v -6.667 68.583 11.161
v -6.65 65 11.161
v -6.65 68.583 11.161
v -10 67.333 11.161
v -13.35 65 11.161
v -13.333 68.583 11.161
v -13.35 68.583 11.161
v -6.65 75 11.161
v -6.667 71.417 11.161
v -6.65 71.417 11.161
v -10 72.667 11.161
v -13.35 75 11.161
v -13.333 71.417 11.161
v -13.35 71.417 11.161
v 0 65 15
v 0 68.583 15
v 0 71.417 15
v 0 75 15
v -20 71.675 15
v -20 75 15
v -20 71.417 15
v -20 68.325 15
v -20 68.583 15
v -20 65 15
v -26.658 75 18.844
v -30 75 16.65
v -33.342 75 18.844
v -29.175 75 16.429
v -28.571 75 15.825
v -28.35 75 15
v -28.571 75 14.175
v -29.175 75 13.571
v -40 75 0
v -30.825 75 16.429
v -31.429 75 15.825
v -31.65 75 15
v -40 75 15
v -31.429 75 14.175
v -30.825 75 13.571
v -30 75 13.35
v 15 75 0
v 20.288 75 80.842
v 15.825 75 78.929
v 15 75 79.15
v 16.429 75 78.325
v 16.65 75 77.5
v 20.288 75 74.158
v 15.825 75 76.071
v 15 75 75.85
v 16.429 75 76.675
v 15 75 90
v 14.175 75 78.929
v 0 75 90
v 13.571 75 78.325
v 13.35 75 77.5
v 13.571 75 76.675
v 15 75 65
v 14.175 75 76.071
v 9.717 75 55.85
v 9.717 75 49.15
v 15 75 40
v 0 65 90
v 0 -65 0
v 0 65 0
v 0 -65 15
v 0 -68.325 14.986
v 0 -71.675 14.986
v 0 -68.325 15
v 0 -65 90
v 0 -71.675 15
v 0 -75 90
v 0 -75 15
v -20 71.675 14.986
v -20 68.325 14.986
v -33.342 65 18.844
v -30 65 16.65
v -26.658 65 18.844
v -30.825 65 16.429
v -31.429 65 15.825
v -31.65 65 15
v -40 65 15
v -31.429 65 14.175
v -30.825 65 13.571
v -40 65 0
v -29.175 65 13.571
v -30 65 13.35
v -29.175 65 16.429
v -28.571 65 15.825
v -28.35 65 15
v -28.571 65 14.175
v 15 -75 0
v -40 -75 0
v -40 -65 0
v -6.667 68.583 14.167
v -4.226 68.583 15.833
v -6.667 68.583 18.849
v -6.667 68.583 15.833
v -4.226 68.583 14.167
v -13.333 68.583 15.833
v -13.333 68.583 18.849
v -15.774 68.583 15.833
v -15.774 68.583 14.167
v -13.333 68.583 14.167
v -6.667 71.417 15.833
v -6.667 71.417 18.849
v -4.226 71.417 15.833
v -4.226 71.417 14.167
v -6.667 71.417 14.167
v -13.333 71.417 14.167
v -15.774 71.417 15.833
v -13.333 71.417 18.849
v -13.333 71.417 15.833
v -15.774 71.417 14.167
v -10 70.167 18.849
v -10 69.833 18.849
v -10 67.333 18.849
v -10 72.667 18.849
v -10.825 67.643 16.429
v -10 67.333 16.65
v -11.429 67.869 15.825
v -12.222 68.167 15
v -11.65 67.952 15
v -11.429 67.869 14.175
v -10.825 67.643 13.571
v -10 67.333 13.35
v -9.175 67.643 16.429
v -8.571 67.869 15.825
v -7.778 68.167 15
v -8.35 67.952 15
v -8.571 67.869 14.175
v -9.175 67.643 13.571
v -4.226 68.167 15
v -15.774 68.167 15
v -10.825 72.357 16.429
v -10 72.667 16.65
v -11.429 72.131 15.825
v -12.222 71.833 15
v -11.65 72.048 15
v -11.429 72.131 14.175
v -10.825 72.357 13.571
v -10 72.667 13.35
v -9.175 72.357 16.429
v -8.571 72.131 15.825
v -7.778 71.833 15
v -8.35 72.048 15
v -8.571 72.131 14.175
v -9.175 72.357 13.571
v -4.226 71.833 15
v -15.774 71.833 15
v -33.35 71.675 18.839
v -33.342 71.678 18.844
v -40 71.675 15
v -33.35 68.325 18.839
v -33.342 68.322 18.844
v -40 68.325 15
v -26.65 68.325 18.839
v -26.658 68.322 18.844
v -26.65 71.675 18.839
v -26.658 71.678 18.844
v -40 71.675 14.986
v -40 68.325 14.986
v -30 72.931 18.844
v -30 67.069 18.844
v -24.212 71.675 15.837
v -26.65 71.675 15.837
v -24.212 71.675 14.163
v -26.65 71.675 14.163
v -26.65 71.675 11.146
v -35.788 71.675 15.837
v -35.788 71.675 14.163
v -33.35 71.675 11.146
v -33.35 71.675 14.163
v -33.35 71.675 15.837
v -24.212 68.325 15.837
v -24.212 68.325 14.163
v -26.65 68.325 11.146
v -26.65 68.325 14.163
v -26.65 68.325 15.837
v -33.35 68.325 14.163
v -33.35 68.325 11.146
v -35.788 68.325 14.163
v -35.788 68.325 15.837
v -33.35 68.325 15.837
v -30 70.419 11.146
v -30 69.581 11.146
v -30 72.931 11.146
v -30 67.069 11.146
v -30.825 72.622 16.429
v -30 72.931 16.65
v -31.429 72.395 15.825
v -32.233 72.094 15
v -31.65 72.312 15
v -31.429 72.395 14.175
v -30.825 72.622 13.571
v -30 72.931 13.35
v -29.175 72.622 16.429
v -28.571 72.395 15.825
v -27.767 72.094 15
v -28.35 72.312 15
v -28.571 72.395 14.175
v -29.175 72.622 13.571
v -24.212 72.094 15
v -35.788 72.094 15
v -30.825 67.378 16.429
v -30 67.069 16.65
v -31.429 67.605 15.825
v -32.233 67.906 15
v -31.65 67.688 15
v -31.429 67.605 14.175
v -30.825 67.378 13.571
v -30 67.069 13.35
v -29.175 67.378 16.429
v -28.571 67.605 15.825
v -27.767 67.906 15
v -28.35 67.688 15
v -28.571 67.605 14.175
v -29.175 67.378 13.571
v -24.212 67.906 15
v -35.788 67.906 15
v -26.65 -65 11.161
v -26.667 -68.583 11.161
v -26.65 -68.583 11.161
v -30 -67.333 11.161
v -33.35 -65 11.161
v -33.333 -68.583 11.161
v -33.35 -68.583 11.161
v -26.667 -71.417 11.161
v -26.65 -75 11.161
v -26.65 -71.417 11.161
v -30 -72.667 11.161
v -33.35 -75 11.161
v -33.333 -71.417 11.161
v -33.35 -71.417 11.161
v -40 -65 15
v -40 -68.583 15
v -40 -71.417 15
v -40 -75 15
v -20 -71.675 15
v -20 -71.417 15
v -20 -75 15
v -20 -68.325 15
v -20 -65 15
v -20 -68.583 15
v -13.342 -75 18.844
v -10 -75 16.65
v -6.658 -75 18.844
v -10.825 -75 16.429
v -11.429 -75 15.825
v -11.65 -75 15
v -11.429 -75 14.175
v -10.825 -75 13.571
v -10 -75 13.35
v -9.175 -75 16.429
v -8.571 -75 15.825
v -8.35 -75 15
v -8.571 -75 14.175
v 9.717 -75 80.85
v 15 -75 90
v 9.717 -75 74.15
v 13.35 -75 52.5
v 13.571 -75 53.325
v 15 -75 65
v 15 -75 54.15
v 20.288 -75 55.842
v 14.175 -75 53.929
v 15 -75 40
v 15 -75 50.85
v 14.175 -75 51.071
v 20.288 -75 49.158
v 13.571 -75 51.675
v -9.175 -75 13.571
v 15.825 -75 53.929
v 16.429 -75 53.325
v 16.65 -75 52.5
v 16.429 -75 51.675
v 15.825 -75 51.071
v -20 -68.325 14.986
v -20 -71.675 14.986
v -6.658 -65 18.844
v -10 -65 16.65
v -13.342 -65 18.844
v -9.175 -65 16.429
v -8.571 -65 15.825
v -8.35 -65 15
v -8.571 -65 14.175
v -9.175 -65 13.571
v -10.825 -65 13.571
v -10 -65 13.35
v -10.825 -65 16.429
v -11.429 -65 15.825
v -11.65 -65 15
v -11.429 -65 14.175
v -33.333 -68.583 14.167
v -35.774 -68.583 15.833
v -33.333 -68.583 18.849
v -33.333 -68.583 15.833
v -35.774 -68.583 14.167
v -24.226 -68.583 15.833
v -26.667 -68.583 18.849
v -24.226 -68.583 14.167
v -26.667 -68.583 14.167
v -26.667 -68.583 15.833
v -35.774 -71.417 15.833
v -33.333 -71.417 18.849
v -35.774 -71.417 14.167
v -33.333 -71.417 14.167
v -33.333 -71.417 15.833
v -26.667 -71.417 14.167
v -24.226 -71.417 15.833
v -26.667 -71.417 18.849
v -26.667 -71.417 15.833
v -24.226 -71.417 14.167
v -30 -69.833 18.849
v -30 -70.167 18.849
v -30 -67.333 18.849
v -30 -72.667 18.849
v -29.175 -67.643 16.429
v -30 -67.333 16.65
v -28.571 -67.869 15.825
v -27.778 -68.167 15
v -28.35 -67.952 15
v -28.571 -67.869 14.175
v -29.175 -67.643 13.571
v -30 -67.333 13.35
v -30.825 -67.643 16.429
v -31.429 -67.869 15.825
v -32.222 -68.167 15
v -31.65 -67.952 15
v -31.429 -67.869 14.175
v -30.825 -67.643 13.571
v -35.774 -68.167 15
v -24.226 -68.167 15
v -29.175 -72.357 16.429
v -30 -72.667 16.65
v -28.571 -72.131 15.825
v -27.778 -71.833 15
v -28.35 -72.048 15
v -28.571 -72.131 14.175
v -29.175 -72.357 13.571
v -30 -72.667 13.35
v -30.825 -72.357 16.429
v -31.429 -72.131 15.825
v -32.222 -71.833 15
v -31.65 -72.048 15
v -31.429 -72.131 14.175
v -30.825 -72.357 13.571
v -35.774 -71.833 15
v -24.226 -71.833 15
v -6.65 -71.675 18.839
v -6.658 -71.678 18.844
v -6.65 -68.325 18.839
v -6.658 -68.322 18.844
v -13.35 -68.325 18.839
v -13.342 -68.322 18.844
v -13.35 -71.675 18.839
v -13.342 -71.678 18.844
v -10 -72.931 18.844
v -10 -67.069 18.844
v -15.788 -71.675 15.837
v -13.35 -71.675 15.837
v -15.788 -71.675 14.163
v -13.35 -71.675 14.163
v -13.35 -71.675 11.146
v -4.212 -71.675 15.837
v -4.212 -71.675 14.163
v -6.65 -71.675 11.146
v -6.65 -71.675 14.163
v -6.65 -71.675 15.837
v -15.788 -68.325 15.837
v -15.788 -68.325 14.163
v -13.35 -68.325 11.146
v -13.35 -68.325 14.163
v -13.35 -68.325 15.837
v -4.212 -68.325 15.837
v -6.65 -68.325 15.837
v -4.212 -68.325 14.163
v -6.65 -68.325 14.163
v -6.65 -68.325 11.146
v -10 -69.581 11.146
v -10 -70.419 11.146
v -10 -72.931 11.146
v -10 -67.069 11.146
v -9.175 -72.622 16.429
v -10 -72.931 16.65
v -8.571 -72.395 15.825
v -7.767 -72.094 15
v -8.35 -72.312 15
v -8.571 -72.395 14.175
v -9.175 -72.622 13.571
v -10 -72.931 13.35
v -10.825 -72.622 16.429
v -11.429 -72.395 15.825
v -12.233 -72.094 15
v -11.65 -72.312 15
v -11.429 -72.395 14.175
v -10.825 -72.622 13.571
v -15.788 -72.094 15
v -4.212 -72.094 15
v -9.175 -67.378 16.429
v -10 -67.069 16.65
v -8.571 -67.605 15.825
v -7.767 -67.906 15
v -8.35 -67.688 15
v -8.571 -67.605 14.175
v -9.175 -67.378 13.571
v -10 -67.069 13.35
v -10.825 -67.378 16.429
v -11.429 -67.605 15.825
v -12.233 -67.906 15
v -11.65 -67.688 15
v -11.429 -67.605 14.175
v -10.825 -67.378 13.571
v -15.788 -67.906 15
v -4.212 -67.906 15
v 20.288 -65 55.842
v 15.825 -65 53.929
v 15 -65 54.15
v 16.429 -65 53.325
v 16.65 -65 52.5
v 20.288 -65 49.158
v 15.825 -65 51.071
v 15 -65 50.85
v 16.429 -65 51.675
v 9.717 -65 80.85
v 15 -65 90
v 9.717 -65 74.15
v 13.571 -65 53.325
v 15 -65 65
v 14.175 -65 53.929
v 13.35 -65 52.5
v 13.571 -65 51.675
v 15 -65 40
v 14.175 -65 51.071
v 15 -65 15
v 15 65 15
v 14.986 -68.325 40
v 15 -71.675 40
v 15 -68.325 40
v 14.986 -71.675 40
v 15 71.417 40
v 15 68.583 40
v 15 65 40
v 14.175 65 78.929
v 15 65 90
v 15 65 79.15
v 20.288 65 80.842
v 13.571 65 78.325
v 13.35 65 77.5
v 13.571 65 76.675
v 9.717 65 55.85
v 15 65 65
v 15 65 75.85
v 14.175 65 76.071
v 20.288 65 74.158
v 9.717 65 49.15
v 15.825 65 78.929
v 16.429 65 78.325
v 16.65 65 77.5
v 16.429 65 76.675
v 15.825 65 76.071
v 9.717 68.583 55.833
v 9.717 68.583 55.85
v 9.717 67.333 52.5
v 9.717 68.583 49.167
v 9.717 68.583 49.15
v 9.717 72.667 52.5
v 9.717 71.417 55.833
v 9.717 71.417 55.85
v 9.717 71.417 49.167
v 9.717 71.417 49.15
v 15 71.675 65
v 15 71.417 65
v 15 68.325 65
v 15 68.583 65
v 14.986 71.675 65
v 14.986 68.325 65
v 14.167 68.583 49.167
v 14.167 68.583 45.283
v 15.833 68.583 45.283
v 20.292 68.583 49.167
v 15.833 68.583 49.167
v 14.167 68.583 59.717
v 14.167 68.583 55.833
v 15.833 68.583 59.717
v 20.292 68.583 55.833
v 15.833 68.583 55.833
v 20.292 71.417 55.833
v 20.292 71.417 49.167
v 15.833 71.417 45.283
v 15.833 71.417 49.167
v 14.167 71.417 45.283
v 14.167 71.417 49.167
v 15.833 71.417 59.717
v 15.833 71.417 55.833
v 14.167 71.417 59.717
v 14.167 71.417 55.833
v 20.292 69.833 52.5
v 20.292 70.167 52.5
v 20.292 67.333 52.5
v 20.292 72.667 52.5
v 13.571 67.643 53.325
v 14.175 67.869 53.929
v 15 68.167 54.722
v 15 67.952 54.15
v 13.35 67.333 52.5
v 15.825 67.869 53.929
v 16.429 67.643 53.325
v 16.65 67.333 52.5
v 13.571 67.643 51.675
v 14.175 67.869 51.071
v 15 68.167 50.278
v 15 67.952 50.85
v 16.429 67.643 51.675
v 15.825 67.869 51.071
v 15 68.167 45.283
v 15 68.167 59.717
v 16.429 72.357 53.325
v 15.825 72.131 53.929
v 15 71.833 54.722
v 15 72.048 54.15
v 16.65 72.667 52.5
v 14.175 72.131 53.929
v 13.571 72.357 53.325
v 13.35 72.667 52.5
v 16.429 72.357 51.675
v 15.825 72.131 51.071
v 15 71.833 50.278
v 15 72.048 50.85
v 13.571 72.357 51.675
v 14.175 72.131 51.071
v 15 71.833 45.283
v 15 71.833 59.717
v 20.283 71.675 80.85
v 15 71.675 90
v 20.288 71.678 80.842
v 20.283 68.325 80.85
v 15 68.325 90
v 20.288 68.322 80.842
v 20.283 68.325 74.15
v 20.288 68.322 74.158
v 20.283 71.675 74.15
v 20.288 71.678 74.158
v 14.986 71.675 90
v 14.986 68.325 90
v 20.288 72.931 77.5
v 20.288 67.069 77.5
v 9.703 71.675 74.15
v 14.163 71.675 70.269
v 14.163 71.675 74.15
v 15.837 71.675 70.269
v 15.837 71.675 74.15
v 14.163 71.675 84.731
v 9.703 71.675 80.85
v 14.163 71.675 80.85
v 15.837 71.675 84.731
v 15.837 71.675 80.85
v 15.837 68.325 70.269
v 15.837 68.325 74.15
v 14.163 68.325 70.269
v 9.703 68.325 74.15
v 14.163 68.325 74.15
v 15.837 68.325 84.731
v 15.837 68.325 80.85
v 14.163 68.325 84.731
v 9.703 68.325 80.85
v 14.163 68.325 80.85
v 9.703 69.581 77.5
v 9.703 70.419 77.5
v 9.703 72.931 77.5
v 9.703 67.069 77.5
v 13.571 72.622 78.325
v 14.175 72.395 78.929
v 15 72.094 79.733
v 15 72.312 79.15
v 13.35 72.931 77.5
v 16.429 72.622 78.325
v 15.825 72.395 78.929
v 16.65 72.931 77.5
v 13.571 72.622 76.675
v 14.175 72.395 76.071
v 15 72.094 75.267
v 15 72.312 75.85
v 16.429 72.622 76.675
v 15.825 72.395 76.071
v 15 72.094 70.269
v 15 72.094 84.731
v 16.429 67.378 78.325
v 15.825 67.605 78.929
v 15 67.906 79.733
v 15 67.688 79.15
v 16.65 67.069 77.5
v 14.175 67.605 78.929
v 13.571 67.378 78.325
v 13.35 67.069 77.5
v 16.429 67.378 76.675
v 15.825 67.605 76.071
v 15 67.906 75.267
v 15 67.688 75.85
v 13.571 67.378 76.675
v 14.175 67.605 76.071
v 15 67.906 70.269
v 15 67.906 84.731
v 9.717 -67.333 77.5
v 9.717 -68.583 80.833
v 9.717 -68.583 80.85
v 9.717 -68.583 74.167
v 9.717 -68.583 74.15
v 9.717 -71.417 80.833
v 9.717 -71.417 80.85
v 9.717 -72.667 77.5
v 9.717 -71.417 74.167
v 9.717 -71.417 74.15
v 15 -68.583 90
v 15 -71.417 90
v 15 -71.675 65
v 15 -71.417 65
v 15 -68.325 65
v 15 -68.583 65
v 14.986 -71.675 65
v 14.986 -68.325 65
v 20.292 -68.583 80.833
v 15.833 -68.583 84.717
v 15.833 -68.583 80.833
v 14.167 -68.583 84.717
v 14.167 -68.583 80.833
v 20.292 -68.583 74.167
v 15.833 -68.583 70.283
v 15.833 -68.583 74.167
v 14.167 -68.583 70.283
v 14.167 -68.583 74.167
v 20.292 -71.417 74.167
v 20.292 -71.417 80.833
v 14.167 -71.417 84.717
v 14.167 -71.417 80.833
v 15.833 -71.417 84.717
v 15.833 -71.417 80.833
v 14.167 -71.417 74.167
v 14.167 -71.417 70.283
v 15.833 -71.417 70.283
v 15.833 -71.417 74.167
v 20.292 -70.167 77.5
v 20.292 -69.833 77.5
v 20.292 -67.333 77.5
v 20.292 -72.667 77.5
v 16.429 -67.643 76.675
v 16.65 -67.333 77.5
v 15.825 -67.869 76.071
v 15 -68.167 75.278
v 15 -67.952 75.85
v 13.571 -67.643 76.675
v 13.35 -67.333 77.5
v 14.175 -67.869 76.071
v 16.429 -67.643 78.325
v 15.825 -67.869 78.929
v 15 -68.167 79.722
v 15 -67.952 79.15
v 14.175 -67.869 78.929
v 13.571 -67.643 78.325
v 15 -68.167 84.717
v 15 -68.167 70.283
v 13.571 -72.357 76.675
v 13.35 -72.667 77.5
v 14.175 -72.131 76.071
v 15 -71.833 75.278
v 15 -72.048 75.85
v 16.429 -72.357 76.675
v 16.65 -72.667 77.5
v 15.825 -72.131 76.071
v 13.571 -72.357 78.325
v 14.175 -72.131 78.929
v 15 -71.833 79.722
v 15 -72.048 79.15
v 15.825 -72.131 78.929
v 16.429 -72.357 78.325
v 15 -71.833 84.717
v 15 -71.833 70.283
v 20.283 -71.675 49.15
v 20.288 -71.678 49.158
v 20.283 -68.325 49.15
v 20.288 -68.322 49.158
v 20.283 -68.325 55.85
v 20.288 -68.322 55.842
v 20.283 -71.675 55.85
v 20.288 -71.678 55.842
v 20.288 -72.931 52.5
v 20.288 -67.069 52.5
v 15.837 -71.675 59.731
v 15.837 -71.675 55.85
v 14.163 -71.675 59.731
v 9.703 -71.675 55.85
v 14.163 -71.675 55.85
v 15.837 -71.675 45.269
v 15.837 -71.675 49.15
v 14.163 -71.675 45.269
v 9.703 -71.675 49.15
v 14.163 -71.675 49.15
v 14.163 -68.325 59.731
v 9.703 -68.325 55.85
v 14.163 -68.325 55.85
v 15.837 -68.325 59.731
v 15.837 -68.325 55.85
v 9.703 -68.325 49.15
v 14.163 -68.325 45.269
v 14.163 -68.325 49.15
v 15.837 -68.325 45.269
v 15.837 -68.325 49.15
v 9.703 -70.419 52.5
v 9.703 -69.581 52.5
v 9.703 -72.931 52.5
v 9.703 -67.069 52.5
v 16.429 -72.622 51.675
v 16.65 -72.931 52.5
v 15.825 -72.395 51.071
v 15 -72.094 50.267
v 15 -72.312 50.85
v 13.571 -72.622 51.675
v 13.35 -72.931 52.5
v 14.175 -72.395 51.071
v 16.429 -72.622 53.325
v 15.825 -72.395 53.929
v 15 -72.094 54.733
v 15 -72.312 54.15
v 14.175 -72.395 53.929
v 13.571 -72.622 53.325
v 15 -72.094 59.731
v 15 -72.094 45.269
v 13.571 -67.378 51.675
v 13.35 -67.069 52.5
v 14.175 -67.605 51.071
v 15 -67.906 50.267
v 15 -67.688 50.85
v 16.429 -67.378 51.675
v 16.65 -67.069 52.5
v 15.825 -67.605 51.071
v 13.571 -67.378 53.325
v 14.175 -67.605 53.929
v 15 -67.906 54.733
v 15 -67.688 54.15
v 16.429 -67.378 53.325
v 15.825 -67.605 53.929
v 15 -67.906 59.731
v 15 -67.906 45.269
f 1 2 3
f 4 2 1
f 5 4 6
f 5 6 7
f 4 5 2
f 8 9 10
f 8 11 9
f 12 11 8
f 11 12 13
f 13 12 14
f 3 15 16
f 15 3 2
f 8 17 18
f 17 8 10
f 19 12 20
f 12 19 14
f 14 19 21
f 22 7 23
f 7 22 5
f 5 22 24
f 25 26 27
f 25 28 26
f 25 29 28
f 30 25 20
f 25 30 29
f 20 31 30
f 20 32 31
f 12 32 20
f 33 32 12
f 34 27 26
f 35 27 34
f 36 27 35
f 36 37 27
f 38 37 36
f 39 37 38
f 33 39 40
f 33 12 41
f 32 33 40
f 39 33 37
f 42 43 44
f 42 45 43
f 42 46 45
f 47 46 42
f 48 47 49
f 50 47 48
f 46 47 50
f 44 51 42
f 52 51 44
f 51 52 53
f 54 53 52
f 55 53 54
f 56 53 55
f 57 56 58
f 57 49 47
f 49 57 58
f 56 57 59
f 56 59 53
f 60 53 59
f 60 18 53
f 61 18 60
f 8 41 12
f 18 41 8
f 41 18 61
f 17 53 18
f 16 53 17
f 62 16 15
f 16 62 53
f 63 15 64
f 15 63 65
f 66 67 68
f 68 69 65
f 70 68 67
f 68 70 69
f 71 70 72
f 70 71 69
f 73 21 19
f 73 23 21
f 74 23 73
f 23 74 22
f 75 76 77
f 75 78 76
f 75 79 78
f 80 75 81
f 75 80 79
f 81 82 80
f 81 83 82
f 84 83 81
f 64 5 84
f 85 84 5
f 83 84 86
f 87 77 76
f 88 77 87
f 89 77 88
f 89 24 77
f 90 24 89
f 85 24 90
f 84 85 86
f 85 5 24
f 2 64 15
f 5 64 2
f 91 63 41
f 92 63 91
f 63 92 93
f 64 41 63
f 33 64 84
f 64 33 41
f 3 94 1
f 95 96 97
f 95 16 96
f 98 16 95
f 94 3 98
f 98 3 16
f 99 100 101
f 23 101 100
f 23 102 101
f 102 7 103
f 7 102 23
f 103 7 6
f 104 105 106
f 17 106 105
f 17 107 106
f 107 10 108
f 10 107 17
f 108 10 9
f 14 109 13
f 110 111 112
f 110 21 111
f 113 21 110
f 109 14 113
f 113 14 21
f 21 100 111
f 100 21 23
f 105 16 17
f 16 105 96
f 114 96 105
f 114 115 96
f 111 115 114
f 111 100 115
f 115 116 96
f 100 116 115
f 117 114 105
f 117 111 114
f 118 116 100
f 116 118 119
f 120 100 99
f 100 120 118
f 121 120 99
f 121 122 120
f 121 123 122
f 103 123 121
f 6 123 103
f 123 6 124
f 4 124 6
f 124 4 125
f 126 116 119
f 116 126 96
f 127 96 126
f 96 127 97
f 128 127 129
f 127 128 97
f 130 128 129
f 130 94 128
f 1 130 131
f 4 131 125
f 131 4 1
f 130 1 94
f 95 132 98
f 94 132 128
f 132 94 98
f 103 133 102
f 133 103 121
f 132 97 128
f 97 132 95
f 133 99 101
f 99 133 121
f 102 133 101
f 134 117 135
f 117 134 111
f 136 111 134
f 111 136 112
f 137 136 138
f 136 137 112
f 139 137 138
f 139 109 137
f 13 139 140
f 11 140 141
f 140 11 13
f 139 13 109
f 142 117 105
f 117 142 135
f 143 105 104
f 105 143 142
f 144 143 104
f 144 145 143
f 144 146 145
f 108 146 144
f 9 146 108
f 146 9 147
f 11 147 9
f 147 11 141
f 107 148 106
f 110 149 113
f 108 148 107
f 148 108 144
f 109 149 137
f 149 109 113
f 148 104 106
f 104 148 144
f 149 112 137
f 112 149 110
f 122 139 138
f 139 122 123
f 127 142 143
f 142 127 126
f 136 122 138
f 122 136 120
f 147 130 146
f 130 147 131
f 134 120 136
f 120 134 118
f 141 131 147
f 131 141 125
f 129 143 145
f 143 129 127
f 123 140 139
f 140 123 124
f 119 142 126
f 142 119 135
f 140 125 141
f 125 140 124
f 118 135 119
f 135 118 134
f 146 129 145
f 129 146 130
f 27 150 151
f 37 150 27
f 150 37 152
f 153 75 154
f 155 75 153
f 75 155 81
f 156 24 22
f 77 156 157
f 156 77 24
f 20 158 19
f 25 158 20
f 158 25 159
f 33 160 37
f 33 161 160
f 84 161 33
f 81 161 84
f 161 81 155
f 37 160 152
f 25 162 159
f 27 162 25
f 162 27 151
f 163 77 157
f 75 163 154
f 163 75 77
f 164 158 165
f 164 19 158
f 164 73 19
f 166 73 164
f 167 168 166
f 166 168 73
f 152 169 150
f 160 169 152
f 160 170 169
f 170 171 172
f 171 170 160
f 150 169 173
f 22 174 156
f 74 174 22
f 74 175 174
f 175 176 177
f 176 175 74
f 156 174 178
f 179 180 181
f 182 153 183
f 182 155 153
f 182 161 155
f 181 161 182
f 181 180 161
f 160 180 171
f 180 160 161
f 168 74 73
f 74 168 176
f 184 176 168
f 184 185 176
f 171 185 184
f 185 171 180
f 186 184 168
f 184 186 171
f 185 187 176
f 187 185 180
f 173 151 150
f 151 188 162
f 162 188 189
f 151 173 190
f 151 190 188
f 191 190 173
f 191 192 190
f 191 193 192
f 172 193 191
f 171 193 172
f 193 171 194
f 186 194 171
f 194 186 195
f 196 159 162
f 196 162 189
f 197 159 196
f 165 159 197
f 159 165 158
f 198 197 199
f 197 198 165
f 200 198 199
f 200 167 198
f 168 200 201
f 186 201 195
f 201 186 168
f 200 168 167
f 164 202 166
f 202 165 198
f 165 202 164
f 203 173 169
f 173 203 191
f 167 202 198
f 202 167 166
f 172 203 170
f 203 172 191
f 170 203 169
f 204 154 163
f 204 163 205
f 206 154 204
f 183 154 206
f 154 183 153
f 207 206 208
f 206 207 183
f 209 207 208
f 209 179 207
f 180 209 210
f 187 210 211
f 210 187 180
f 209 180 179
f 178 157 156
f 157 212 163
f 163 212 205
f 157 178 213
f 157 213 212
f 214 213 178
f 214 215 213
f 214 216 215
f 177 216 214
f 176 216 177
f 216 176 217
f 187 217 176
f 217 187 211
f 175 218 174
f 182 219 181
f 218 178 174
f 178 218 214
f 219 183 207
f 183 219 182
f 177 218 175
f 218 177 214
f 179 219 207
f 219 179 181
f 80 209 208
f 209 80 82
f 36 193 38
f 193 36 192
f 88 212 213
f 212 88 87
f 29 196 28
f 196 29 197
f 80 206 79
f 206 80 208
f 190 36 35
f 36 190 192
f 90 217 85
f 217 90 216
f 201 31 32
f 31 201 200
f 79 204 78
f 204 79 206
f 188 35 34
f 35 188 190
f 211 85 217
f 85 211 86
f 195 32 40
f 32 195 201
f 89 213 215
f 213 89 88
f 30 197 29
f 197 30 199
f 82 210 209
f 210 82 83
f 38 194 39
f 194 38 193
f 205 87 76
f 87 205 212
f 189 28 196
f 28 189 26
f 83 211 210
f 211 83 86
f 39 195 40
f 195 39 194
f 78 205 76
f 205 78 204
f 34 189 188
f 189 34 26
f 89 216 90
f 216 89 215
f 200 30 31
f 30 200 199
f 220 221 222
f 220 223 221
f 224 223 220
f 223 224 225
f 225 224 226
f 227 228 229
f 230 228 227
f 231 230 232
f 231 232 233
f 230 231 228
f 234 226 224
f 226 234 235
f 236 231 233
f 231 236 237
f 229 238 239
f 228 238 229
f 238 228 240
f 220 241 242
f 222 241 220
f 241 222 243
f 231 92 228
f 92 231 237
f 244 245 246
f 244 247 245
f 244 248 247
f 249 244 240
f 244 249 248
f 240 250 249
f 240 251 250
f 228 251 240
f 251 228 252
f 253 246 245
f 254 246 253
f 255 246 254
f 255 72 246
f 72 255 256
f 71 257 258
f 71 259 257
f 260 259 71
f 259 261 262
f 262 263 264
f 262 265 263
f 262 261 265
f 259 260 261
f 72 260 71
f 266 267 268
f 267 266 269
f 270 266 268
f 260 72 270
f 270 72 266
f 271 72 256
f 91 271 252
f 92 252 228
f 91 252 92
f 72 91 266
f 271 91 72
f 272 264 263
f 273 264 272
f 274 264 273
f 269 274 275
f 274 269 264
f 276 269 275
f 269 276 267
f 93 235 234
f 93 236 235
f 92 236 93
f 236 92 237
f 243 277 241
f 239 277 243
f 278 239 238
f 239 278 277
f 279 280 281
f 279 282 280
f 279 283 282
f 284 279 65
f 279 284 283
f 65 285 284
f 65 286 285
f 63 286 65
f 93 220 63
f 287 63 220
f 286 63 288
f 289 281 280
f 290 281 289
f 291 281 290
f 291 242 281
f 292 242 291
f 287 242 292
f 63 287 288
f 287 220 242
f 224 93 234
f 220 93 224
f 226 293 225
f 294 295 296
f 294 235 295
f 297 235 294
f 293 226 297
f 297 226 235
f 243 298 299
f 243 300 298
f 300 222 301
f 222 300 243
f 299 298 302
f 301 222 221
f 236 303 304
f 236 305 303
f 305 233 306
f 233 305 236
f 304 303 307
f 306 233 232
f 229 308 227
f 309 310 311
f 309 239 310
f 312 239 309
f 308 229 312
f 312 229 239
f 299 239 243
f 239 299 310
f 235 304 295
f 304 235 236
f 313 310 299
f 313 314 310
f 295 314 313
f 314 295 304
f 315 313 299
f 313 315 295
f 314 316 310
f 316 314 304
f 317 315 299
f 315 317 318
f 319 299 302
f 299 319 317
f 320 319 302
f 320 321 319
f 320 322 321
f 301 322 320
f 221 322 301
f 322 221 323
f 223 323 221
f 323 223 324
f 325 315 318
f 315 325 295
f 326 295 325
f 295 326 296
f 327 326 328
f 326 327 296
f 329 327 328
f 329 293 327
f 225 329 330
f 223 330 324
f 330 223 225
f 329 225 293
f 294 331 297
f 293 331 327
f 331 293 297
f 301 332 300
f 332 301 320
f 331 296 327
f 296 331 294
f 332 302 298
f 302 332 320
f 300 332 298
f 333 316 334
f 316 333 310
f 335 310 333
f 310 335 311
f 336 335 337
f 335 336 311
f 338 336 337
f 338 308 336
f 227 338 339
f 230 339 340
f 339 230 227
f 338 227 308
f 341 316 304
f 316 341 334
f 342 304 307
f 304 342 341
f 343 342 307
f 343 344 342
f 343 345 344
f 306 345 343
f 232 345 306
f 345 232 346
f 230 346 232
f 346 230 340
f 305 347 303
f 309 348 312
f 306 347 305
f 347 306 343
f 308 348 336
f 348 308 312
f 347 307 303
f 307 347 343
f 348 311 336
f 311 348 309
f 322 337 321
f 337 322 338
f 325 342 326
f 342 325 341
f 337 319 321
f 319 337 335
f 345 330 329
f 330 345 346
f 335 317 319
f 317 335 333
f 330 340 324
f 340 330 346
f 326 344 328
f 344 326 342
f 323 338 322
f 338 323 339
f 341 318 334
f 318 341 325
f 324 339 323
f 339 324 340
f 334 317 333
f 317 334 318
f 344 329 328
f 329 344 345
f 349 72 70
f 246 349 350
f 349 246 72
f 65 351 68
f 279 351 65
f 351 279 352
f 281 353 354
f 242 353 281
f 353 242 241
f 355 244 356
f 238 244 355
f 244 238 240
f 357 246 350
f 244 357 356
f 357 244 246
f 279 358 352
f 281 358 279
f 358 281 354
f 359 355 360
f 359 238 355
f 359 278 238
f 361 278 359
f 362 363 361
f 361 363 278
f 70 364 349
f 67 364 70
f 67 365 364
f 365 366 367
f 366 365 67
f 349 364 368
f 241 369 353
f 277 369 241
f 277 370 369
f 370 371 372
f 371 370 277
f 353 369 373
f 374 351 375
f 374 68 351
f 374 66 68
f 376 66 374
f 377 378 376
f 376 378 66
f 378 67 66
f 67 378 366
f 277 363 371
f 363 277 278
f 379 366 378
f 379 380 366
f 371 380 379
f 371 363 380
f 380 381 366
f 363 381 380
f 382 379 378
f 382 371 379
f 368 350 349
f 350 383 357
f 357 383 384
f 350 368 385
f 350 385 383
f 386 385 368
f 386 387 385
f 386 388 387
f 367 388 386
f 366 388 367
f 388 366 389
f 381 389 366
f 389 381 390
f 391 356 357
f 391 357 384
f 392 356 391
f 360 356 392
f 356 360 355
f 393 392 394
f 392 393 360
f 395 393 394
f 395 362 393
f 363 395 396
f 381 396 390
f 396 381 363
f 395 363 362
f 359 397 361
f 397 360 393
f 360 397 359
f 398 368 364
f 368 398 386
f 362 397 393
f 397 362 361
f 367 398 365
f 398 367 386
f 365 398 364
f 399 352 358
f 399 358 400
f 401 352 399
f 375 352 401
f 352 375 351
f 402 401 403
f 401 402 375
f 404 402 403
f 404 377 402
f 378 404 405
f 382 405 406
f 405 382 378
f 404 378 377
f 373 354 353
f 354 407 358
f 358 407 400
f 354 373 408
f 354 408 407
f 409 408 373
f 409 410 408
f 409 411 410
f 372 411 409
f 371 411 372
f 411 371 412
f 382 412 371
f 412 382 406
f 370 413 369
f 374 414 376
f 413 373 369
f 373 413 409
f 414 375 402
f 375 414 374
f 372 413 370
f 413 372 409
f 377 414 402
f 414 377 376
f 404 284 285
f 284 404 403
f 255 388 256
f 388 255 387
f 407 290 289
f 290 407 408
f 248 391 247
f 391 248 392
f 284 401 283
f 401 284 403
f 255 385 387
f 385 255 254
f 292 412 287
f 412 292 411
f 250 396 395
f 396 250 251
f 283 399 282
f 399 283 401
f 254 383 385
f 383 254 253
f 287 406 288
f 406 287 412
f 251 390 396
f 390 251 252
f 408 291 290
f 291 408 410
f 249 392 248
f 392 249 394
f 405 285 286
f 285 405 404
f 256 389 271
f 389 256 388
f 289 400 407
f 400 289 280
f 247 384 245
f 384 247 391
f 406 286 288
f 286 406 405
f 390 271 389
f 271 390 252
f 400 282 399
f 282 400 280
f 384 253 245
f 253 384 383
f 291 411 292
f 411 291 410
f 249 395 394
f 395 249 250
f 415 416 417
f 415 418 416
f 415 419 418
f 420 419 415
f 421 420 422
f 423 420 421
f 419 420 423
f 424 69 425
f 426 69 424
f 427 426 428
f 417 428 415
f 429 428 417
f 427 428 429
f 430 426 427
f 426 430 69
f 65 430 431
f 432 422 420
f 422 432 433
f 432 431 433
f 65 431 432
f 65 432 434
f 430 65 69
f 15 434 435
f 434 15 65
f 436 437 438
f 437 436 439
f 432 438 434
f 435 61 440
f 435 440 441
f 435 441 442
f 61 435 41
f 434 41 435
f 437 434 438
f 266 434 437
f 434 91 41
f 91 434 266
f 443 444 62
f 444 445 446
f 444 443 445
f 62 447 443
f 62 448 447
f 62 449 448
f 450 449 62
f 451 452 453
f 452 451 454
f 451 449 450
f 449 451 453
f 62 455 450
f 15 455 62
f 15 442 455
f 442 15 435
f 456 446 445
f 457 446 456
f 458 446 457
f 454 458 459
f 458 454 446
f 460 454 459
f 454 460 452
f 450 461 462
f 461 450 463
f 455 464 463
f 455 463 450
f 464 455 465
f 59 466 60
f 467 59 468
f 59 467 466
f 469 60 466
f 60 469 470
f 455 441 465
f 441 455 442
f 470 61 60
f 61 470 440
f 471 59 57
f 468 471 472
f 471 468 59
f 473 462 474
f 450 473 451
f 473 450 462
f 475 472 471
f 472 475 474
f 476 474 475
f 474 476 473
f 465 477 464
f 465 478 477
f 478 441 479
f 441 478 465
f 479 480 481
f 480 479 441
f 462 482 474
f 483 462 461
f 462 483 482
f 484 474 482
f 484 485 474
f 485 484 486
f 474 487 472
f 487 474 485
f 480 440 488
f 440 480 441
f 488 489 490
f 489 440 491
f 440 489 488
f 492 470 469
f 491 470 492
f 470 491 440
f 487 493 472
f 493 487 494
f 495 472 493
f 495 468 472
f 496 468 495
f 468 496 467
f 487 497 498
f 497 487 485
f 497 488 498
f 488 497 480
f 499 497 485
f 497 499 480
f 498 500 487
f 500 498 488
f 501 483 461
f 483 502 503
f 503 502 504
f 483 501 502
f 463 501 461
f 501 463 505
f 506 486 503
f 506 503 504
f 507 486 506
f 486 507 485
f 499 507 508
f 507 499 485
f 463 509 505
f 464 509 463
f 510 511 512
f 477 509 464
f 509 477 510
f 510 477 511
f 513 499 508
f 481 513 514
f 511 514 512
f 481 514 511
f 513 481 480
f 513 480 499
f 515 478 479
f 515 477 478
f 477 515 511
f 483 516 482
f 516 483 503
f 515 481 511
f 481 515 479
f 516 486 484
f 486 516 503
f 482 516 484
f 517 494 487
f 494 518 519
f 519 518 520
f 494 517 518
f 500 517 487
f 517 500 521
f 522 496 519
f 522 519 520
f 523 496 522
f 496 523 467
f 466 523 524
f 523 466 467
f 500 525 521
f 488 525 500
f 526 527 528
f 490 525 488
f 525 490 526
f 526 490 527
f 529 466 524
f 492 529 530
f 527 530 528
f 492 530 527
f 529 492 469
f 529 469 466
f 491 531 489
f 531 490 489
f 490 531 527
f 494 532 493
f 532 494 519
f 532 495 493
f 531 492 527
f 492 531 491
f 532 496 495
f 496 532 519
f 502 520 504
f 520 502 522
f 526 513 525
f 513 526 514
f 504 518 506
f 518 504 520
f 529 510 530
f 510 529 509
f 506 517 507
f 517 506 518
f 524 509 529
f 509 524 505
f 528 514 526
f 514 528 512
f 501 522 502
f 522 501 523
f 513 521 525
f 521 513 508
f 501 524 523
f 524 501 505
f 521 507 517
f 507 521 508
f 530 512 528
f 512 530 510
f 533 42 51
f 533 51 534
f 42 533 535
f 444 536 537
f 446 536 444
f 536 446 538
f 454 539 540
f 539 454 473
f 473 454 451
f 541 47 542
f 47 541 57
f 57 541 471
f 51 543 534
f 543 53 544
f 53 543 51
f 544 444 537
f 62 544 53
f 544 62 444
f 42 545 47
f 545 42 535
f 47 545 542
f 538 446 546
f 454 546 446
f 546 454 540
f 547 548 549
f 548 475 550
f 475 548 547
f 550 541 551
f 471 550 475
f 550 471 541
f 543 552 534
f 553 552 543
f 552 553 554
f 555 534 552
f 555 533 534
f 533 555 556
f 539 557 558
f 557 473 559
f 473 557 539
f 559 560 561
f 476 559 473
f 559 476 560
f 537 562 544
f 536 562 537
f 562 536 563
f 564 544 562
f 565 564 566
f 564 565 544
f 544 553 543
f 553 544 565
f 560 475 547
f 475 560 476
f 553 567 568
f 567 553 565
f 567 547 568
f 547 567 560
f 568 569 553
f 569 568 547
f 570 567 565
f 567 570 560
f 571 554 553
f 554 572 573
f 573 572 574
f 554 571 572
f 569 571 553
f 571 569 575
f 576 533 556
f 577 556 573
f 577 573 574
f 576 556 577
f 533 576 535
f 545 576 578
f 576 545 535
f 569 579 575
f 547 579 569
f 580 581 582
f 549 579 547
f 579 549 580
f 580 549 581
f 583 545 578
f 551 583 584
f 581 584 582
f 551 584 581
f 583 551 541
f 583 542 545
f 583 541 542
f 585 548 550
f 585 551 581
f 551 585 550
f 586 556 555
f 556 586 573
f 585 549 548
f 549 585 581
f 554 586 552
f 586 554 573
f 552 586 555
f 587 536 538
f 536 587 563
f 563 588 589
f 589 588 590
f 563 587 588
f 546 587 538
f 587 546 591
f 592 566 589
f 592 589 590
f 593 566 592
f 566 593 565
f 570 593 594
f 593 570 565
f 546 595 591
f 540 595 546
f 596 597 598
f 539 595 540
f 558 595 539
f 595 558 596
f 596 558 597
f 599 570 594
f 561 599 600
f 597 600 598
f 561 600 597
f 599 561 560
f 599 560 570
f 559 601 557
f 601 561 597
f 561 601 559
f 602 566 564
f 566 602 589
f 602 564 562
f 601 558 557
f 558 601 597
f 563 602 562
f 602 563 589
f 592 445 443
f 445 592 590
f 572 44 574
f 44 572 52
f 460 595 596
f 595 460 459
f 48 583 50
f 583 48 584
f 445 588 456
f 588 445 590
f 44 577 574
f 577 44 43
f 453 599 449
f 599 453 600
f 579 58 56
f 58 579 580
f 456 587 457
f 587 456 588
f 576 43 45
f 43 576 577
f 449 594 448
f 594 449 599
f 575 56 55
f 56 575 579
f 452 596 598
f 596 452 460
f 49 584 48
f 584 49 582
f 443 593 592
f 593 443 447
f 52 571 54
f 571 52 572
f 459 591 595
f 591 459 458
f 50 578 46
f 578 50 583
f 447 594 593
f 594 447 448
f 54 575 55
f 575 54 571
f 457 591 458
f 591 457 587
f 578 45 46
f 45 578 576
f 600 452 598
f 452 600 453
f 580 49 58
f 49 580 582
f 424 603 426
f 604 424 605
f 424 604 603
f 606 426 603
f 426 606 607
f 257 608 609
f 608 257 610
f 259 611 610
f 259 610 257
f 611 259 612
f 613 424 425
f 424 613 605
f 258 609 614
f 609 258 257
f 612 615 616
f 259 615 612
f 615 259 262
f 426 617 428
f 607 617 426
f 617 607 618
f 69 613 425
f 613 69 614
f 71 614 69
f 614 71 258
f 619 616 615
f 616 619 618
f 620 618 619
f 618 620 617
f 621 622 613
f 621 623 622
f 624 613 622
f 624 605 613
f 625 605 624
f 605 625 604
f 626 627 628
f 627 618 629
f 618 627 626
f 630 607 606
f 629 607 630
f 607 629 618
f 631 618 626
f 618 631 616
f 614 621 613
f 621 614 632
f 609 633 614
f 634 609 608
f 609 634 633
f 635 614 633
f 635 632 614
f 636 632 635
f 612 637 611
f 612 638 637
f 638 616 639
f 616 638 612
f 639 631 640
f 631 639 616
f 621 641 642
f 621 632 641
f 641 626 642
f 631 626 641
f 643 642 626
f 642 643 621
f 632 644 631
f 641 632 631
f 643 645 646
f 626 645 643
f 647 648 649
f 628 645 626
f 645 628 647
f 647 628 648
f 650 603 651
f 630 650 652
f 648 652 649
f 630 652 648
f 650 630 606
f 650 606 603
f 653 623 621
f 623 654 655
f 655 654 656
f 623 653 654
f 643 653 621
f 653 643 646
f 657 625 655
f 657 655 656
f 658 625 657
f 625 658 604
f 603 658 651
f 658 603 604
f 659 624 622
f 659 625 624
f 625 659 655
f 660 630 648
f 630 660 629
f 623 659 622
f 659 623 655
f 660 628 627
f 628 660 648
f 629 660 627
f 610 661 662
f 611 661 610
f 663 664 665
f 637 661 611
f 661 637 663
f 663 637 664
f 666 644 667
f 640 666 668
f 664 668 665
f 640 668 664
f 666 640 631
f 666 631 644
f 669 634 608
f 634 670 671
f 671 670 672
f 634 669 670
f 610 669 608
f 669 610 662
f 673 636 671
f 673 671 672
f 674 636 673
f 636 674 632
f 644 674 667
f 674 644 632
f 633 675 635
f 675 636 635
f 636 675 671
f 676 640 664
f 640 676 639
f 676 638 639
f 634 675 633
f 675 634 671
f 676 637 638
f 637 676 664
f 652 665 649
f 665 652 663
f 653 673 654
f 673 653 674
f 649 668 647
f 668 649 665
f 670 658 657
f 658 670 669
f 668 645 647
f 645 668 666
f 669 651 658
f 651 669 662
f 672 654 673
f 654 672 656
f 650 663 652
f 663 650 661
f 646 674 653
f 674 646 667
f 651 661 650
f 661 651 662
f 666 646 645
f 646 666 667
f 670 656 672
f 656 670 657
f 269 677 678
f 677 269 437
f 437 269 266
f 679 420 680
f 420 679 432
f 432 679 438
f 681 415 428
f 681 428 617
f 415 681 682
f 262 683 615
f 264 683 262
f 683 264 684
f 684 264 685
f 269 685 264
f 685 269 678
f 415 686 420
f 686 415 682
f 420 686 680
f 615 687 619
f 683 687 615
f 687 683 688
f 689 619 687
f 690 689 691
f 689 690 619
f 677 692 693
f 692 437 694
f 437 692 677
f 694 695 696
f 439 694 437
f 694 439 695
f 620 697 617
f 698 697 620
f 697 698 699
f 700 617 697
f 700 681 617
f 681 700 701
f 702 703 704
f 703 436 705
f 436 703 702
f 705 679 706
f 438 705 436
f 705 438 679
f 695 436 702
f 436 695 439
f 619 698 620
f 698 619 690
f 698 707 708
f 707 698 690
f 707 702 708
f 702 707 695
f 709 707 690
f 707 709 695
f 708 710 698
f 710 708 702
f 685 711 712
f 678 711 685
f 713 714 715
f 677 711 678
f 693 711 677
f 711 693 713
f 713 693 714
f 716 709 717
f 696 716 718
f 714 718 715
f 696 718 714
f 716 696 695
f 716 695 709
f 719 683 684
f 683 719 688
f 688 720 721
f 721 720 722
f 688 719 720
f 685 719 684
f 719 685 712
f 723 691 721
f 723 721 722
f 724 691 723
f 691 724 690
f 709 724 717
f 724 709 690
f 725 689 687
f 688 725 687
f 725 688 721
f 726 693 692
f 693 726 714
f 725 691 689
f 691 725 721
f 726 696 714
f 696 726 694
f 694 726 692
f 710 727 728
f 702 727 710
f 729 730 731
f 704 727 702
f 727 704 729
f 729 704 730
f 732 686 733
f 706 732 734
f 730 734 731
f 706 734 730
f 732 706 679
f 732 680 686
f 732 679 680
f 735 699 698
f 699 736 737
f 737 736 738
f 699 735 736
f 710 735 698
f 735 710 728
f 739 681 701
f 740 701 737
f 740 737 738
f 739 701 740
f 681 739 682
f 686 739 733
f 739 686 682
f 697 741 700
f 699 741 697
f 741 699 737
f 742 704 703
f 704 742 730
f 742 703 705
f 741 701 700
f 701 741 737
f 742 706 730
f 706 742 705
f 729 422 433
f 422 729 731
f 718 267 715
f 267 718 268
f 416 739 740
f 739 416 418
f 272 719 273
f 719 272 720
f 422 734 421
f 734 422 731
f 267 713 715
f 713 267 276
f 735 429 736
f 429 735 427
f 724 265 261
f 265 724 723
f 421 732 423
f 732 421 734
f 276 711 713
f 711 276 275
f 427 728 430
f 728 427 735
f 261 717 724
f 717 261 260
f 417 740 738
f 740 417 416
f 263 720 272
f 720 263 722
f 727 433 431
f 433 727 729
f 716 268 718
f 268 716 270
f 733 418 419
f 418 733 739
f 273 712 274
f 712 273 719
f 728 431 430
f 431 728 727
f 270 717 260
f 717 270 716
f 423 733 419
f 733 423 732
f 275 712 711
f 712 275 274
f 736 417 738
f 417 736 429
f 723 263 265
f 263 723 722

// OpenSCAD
// file: joiners.scad
include <config.scad>
use <GDMUtils.scad>


module half_joiner_clear(h=20, w=10, a=30)
{
	dmnd_height = h*1.0;
	dmnd_width = dmnd_height*tan(a);
	guide_size = w/3;
	guide_width = 2*(dmnd_height/2-guide_size)*tan(a);

	difference() {
		// Diamonds.
		scale([w, dmnd_width/2, dmnd_height/2]) {
			xrot(45) cube(size=[1,sqrt(2),sqrt(2)], center=true);
		}
		// Blunt point of tab.
		grid_of(ya=[-(guide_width/2+2), (guide_width/2+2)]) {
			cube(size=[w*1.05, 4, guide_size*2], center=true);
		}
	}
}
//half_joiner_clear();



module half_joiner(h=20, w=10, l=10, a=30, screwsize=3, guides=true, slop=printer_slop)
{
	dmnd_height = h*1.0;
	dmnd_width = dmnd_height*tan(a);
	guide_size = w/3;
	guide_width = 2*(dmnd_height/2-guide_size)*tan(a);

	difference() {
		union() {
			// Make base.
			difference() {
				// Solid backing base.
				translate([0,-l/2,0])
					cube(size=[w, l, h], center=true);

				// Clear diamond for tab
				half_joiner_clear(h=h, w=w+0.05, a=a);
			}

			difference() {
				// Make tab
				scale([w/3-slop*2, dmnd_width/2, dmnd_height/2]) xrot(45)
					cube(size=[1,sqrt(2),sqrt(2)], center=true);

				// Blunt point of tab.
				translate([0,guide_width/2+2,0])
					cube(size=[w*0.99,4,guide_size*2], center=true);
			}


			// Guide ridges.
			if (guides == true) {
				grid_of(xa=[-(w/6-slop), (w/6-slop)]) {
					// Guide ridge.
					scale([0.75, 1, 2]) yrot(45)
						cube(size=[guide_size/sqrt(2), guide_width, guide_size/sqrt(2)], center=true);

					// Snap ridge.
					scale([0.25, 0.5, 1]) zrot(45)
						cube(size=[guide_size/sqrt(2), guide_size/sqrt(2), dmnd_width], center=true);
				}
			}
		}

		// Make screwholes, if needed.
		if (screwsize != undef) {
			yrot(90) cylinder(r=screwsize*1.1/2, h=w+1, center=true, $fn=12);
		}
	}
}
//half_joiner(screwsize=3);



module half_joiner2(h=20, w=10, l=10, a=30, screwsize=3, guides=true)
{
	difference() {
		union () {
			translate([0,-l/2,0])
				cube(size=[w, l, h], center=true);
			half_joiner_clear(h=h, w=w, a=a);
		}

		// Subtract mated half_joiner.
		zrot(180) half_joiner(h=h+0.05, w=w+0.05, l=l+0.05, a=a, screwsize=undef, guides=guides, slop=0.0);

		// Make screwholes, if needed.
		if (screwsize != undef) {
			yrot(90) cylinder(r=screwsize*1.1/2, h=w+1, center=true, $fn=12);
		}
	}
}
//half_joiner2(screwsize=3);



module joiner(h=40, w=10, l=10, a=30, screwsize=3, guides=true, slop=printer_slop)
{
	render(convexity=10) union() {
		translate([0,0,h/4])
			half_joiner(h=h/2, w=w, l=l, a=a, screwsize=screwsize, guides=guides, slop=slop);
		translate([0,0,-h/4])
			half_joiner2(h=h/2, w=w, l=l, a=a, screwsize=screwsize, guides=guides);
	}
}
//joiner(screwsize=3);



module joiner_clear(h=40, w=10, a=30)
{
	grid_of(za=[-h/4,h/4]) {
		half_joiner_clear(h=h/2.0, w=w, a=a);
	}
}
//joiner_clear();



module joiner_pair(spacing=100, h=40, w=10, l=10, a=30, screwsize=3, guides=true)
{
	yrot_copies([0,180]) {
		translate([spacing/2, 0, 0]) {
			joiner(h=h, w=w, l=l, a=a, screwsize=screwsize, guides=guides);
		}
	}
}
//joiner_pair(spacing=100, h=40, w=10, l=10, a=30, screwsize=3, guides=true);



module joiner_pair_clear(spacing=100, h=40, w=10, a=30)
{
	yrot_copies([0,180]) {
		translate([spacing/2, 0, 0]) {
			joiner_clear(h=h, w=w, a=a);
		}
	}
}
//joiner_pair_clear(spacing=100, h=40, w=10, a=30);



module joiner_quad(xspacing=100, yspacing=50, h=40, w=10, l=10, a=30, screwsize=3, guides=true)
{
	zrot_copies([0,180]) {
		translate([0, yspacing/2, 0]) {
			joiner_pair(spacing=xspacing, h=h, w=w, l=l, a=a, screwsize=screwsize, guides=guides);
		}
	}
}
//joiner_quad(xspacing=100, yspacing=50, h=40, w=10, l=10, a=30, screwsize=3, guides=true);



module joiner_quad_clear(xspacing=100, yspacing=50, h=40, w=10, a=30)
{
	zrot_copies([0,180]) {
		translate([0, yspacing/2, 0]) {
			joiner_pair_clear(spacing=xspacing, h=h, w=w, a=a);
		}
	}
}
//joiner_quad_clear(xspacing=100, yspacing=50, h=40, w=10, a=30);



// vim: noexpandtab tabstop=4 shiftwidth=4 softtabstop=4 nowrap
// file: config.scad
snappy_version = 0.91;


// 0 = Thinning Walls (Thin in the middle, thick at edges.  Prettier smooth walls.)
// 1 = Corrugated walls. (Zig-zagged walls. Less shrinkage stress. Closed walls.)
// 2 = Crossbeam walls. (Open sparse struts. Far less shrinkage stress.)
wall_styling = 2;


platform_length = 100; // mm.  Must be a multiple of rack_tooth_size.
platform_width  = 150; // mm
platform_height =  40; // mm
platform_thick  =   7; // mm

rail_length   = 150;    // mm
rail_height   =  50;    // mm
rail_thick    =   7;    // mm
rail_offset   =  12;    // mm

motor_rail_length = 100; // mm

groove_angle  =  30;    // degrees
groove_height =  12;    // mm

joiner_angle  =  30;    // degrees
joiner_width  =  10;    // mm

rack_tooth_size  =  5; // mm per tooth.
set_screw_size   =  3; // mm size of set screw in drive gears, couplers, etc
motor_shaft_size =  5; // mm
motor_shaft_flatted = false;  // boolean. Set true if motor shaft has a flattened side.

// Currently configured for 3/8" ACME threaded rod and matching 11/16" nut
lifter_rod_diam    =   9.5; // mm
lifter_rod_length  = 300.0; // mm
lifter_nut_size    =  17.4; // mm
lifter_nut_thick   =   9.3; // mm
lifter_thread_size =   3.175; // mm lift per revolution

endstop_hole_spacing = 19;   // mm
endstop_hole_inset   =  3.2; // mm
endstop_hole_hoff    = 10;   // mm
endstop_screw_size   =  3;   // mm

// This is the slop needed to make parts fit more exactly, and may be
// printer dependant.  Printing a slop calibration plate should help
// dial this setting in for your printer.
printer_slop =   0.25; // mm



// Commonly used derived values.  Don't change these.
rail_spacing = platform_width - joiner_width*4 - 10;
rail_width = rail_spacing + joiner_width*2;
motor_mount_spacing=43+joiner_width+10;

wall_styles = ["thinwall", "corrugated", "crossbeams"];
wall_style = wall_styles[wall_styling];


// vim: noexpandtab tabstop=4 shiftwidth=4 softtabstop=4 nowrap
// main file
include <config.scad>
use <GDMUtils.scad>
use <joiners.scad>


module cantilever_joint()
{
	joiner_length=15;

	color("Chocolate")
	render(convexity=10)
	union() {
		// Top hanger joiners.
		translate([0, -platform_height/2, 0]) {
			xrot(-90) joiner_pair(spacing=platform_width-joiner_width, h=platform_height, w=joiner_width, l=joiner_length, a=joiner_angle);
		}

		// Bottom strut
		translate([0, joiner_length/2, joiner_length/2])
			cube(size=[platform_width, joiner_length, joiner_length], center=true);

		// Front struts
		grid_of(
			xa=[-(platform_width-joiner_width)/2, (platform_width-joiner_width)/2],
			ya=[joiner_length/2],
			za=[-(platform_length-rail_height)/4]
		) {
			cube(size=[joiner_width, joiner_length, (platform_length-rail_height)/2], center=true);
		}

		// Front joiners.
		translate([0, joiner_length, -platform_length/2]) {
			joiner_pair(spacing=platform_width-joiner_width, h=rail_height, w=joiner_width, l=joiner_length, a=joiner_angle);
		}
	}
}
//!cantilever_joint();



module cantilever_joint_parts() { // make me
	translate([0, 0, 15]) zrot(90) xrot(180) {
		cantilever_joint();
	}
}



cantilever_joint_parts();



// vim: noexpandtab tabstop=4 shiftwidth=4 softtabstop=4 nowrap
